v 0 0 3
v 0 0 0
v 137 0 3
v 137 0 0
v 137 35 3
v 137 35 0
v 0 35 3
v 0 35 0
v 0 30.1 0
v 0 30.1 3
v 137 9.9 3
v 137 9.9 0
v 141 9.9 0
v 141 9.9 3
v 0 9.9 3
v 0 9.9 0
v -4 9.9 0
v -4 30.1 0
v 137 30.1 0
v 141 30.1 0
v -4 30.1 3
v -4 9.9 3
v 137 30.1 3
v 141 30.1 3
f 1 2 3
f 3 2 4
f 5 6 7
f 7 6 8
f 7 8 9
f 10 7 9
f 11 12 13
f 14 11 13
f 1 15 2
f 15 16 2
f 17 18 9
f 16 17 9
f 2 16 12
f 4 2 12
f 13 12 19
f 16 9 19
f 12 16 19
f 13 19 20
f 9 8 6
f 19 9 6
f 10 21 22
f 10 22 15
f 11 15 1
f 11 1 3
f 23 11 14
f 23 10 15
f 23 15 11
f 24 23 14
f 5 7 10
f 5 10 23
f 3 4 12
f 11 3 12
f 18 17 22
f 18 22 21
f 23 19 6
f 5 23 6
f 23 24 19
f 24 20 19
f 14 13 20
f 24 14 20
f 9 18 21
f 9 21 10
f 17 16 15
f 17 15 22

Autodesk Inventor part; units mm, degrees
ref_plane "YZ Plane" through (0, 0, 0) normal (1, 0, 0) x (0, 1, 0)
ref_plane "XZ Plane" through (0, 0, 0) normal (0, 1, 0) x (-1, 0, 0)
ref_plane "XY Plane" through (0, 0, 0) normal (0, 0, 1) x (1, 0, 0)
sketch "Sketch1" plane through (0, 0, 0) normal (0, 0, 1) x (1, 0, 0)
  line L0 (0, 0) -> (137, 0)
  line L1 (137, 0) -> (137, 35)
  line L2 (137, 35) -> (0, 35)
  line L3 (0, 35) -> (0, 0)
  line L4 (141, 30.1) -> (137, 30.1)
  line L5 (137, 30.1) -> (137, 9.9)
  line L6 (137, 9.9) -> (141, 9.9)
  line L7 (141, 9.9) -> (141, 30.1)
  line L8 (141, 30.1) -> (137, 9.9) construction
  line L9 (137, 30.1) -> (141, 9.9) construction
  line L10 (-4, 30.1) -> (0, 30.1)
  line L11 (0, 30.1) -> (0, 9.9)
  line L12 (0, 9.9) -> (-4, 9.9)
  line L13 (-4, 9.9) -> (-4, 30.1)
  line L14 (-4, 30.1) -> (0, 9.9) construction
  line L15 (0, 30.1) -> (-4, 9.9) construction
  point P0 (139, 20)
  point P1 (-2, 20)
  point P2 (0, 30.1)
  point P3 (0, 30.1)
  point P4 (137, 30.1)
  point P5 (100, 25)
  point P6 (0, 25)
  dimension "d0" = 4
  dimension "d1" = 4
  dimension "d2" = 137
  dimension "d3" = 35
  dimension "d4" = 20.2
  dimension "d5" = 9.9
extrude "Extrusion1" add sketch "Sketch1" along normal blind 3
properties part number "Battary_holder_part2"
